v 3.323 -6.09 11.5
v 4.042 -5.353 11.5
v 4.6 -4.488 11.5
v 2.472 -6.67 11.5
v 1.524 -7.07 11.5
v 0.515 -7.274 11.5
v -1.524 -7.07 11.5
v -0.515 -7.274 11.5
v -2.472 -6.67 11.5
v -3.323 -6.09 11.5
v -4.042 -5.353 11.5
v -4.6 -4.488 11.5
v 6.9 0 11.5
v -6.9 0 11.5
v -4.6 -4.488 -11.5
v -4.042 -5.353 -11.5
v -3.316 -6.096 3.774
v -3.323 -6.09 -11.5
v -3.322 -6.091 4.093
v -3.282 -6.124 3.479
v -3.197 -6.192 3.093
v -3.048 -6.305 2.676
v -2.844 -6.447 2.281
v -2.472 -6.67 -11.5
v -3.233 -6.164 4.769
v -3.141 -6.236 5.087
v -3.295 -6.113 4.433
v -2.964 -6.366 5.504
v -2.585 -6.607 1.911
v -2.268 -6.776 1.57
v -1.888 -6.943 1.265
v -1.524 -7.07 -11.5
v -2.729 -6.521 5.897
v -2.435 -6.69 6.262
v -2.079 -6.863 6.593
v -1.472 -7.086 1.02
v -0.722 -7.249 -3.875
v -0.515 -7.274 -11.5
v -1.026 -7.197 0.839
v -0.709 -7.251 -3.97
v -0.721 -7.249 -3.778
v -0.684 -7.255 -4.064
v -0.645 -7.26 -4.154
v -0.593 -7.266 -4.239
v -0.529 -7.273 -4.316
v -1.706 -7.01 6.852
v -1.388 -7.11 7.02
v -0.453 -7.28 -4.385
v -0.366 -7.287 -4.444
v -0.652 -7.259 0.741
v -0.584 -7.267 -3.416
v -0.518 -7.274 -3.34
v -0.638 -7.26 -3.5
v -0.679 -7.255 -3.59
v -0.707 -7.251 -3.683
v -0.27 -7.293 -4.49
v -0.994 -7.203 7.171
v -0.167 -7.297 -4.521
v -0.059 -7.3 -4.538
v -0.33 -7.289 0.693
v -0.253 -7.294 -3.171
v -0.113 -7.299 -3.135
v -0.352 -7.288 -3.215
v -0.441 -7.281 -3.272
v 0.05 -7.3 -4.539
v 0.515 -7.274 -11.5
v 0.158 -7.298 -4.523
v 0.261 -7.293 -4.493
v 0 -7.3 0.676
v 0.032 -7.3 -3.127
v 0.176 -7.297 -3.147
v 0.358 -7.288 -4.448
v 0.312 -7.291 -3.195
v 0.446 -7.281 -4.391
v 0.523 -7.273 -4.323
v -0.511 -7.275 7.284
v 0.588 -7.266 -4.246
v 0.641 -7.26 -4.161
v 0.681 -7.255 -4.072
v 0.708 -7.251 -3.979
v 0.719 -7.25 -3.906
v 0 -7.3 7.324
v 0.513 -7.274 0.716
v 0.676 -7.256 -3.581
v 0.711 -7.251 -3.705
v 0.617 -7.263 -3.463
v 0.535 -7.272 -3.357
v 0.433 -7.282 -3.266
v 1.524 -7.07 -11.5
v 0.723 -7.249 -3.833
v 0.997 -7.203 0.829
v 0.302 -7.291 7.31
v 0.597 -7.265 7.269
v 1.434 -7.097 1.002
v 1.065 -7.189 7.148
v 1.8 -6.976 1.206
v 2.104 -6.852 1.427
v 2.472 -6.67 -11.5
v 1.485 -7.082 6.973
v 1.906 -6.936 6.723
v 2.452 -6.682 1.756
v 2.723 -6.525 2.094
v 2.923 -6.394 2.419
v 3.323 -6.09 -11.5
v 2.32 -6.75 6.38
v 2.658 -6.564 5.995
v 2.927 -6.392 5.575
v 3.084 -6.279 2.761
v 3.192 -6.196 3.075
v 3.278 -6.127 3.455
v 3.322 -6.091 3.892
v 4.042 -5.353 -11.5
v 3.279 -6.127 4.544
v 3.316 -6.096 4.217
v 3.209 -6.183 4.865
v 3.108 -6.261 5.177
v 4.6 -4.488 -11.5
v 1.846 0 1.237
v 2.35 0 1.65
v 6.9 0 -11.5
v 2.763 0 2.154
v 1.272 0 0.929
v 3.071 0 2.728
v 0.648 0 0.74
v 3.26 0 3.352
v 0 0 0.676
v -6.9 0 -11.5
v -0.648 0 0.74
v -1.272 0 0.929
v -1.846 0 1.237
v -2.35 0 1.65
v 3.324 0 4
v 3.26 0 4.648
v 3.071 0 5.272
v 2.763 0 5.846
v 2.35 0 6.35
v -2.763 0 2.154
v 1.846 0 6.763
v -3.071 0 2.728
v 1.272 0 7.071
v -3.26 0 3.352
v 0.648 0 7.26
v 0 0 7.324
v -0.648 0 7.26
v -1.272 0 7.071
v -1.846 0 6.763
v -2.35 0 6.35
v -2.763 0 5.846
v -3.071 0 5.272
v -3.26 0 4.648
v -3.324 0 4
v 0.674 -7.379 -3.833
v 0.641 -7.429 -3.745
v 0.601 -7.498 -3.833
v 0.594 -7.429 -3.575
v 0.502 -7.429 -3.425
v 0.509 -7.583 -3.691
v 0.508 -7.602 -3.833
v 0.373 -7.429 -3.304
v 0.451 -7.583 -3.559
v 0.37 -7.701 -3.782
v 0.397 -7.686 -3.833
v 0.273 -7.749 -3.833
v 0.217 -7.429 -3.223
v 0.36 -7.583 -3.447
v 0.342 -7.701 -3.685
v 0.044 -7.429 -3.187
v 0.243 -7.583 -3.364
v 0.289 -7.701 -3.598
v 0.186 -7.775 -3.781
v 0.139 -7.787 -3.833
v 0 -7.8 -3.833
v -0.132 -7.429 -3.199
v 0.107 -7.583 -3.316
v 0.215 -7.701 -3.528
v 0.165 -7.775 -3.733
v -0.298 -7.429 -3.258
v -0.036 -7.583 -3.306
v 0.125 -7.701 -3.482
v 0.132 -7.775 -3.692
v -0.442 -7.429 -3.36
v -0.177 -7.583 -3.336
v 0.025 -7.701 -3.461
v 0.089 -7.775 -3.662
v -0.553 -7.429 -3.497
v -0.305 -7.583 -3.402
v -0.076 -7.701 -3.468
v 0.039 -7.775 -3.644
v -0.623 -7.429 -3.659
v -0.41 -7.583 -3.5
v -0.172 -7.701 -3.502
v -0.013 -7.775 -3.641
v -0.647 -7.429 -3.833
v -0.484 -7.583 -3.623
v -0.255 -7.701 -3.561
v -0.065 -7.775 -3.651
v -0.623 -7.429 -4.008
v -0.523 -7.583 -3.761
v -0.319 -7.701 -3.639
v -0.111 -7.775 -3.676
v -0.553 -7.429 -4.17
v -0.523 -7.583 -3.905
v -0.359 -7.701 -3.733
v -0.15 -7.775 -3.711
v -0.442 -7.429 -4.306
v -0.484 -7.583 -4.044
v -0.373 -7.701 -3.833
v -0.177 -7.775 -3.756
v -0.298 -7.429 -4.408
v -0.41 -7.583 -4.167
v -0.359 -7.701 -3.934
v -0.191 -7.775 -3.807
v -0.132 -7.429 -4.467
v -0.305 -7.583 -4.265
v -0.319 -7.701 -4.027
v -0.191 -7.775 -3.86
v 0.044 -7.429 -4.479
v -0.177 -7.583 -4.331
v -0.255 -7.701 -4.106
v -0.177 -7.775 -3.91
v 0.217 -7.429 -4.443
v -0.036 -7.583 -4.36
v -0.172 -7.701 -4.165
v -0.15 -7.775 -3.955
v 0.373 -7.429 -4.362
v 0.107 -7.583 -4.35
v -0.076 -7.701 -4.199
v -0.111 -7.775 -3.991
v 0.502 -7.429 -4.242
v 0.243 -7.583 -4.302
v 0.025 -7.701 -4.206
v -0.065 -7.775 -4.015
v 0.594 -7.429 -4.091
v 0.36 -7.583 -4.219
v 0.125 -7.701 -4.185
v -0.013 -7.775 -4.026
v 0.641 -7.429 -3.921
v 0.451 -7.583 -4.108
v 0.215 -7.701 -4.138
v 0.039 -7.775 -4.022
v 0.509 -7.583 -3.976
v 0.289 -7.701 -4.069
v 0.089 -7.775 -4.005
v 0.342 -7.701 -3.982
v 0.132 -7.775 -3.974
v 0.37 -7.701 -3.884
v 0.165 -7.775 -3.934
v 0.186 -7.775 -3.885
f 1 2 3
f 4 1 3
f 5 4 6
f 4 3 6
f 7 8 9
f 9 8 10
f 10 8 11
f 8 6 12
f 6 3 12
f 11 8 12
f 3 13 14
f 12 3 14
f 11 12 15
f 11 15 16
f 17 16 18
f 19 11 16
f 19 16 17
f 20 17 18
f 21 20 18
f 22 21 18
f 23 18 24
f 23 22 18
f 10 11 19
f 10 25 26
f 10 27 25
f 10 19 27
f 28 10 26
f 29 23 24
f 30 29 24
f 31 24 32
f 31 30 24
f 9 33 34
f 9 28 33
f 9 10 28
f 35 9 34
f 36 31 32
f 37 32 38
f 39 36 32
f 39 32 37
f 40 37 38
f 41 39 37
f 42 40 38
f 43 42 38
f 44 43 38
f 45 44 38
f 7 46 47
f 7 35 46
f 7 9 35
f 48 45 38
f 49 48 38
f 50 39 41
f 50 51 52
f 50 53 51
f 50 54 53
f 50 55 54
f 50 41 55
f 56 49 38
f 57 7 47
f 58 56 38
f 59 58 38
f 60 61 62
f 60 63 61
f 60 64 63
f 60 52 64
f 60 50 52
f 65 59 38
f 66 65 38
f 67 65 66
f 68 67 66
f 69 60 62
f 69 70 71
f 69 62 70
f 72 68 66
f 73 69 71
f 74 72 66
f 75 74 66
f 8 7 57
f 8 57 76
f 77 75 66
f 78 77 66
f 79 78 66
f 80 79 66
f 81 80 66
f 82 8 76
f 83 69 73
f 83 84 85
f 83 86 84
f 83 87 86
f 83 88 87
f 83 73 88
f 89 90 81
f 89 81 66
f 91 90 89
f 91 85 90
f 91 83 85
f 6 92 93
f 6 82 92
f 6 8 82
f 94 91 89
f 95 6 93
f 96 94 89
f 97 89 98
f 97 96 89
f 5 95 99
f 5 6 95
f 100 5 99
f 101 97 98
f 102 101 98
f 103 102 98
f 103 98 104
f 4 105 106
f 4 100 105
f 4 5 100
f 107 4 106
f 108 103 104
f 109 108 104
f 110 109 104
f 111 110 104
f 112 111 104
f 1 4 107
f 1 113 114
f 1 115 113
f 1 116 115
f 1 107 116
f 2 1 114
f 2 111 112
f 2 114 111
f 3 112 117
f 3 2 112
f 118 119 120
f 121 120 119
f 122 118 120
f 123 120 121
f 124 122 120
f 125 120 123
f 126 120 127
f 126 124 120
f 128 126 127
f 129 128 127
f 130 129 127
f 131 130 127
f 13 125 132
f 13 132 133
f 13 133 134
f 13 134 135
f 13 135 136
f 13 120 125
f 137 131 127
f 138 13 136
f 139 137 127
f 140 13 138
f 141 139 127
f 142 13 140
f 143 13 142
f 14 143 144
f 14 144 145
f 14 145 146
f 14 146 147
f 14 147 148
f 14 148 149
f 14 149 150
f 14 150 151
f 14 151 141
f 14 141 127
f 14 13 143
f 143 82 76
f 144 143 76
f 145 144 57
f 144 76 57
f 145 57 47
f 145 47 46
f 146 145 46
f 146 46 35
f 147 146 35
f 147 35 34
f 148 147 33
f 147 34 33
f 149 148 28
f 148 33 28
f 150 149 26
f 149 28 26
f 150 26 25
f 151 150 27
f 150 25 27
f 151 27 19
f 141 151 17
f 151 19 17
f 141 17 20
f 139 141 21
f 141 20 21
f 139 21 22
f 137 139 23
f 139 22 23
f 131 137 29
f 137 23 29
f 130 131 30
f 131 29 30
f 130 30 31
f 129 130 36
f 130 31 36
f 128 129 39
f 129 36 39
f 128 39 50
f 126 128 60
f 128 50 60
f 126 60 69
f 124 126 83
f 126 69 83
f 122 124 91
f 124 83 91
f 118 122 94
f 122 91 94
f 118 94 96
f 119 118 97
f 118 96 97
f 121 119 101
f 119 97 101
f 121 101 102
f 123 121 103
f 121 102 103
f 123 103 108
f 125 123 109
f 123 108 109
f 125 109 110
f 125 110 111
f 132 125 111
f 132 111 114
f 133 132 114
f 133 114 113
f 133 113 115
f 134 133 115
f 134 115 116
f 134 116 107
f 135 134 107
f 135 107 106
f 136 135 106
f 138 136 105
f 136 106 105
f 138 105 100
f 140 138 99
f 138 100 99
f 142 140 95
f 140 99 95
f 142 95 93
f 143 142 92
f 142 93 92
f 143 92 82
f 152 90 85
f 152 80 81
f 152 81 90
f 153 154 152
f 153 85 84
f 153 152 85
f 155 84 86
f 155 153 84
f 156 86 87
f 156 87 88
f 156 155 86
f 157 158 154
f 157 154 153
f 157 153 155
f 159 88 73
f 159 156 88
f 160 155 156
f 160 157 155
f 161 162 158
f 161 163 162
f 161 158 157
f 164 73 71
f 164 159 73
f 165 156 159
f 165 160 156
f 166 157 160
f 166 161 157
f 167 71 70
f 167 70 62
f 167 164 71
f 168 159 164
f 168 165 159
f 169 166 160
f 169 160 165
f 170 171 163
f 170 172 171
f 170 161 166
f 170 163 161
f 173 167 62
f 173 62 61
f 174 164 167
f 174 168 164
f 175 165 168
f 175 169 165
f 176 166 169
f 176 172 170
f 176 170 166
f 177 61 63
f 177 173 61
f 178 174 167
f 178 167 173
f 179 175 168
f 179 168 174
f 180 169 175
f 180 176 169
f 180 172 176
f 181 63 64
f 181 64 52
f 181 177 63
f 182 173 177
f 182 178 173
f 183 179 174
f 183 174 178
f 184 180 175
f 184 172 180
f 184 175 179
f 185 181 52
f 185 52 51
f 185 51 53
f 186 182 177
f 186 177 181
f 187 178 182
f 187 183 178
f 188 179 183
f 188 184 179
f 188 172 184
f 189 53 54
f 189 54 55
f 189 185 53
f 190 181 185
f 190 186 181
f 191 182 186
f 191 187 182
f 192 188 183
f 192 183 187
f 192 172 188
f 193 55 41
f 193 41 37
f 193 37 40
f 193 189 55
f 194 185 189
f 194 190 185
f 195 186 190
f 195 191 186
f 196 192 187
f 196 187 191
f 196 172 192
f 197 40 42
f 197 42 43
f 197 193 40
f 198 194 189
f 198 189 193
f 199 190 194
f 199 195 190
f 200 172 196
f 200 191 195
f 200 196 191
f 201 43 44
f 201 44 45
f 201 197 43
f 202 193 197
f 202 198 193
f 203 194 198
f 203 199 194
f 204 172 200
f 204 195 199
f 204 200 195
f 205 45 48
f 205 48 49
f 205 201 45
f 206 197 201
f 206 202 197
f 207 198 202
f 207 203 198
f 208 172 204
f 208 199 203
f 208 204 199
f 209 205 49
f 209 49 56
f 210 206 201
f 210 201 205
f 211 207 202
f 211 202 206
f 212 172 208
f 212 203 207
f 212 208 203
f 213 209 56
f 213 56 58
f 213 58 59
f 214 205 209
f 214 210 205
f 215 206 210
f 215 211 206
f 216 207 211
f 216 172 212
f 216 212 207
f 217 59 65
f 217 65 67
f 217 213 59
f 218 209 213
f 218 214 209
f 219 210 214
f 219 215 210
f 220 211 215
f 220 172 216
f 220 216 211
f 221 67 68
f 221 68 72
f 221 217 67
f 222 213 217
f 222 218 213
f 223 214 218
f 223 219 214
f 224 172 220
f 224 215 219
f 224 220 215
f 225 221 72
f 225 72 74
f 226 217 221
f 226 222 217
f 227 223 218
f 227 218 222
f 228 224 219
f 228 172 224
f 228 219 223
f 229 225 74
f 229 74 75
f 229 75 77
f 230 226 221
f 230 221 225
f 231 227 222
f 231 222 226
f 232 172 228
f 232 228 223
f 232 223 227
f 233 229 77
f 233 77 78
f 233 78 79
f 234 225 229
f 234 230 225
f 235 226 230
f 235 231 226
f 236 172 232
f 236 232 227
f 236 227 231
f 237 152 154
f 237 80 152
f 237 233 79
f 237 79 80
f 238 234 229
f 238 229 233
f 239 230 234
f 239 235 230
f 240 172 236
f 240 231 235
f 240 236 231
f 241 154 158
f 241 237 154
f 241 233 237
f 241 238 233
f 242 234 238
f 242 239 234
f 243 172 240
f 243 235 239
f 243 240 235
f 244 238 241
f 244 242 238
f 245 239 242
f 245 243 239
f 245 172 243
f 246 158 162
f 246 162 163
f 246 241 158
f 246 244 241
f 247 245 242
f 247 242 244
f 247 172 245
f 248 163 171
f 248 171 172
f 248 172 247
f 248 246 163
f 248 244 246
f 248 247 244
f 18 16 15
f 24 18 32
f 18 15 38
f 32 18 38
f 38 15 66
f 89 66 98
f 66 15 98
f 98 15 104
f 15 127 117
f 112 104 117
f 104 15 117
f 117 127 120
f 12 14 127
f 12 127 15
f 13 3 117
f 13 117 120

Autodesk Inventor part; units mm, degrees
ref_plane "YZ Plane" through (0, 0, 0) normal (1, 0, 0) x (0, 1, 0)
sketch "Sketch2" plane through (0, 0, 0) normal (0, 1, 0) x (-1, 0, 0)
  line L0 (6.9, -11.5) -> (-6.9, -11.5)
  line L1 (-6.9, -11.5) -> (-6.9, 11.5)
  line L2 (-6.9, 11.5) -> (6.9, 11.5)
  line L3 (6.9, 11.5) -> (6.9, -11.5)
  point P0 (0, 4)
  point P1 (0, -11.5)
  point P2 (0, 11.5)
  point P3 (0, 0)
  point P4 (-6.9, 0)
  dimension "CenterHole" = 7.5
  dimension "Length" = 23
  dimension "Width" = 13.8
extrude "NutBase" add sketch "Sketch2" against normal blind 7.3
hole "Hole1" at (0, 0, 4) direction (0, -1, 0) diameter 6.647 end through all thread size "M8x1.25" class "6H" standard "ANSI Metric M Profile"
ref_plane "MidPlane" through (-6.9, 0, 0) normal (0, 0, -1) x (-1, 0, 0)
ref_plane "Work Plane4" through (6.9, 0, -3.8333) normal (0, 0, -1) x (-1, 0, 0)
sketch "Sketch3" plane through (-6.9, 0, 11.5) normal (0, 0, 1) x (1, 0, 0)
  line L0 (0, -7.3) -> (13.8, -7.3) construction
  line L1 (13.8, 0) -> (0, 0) projected
  line L2 (0, 0) -> (2.3, -4.4884)
  arc A0 (2.3, -4.4884) -> (11.5, -4.4884) centre (6.9, -2.1312) ccw
  line L3 (11.5, -4.4884) -> (13.8, 0)
  line L4 (6.9, -2.1312) -> (6.9, 0) construction
  dimension "d12" = 9.2
extrude "Standard TSlot" cut sketch "Sketch3" along normal through all both and the other way through all keep common part
sketch "Sketch5" plane through (-6.9, 0, 11.5) normal (0, 0, 1) x (1, 0, 0)
  line L0 (0, -7.3) -> (13.8, -7.3) construction
  line L1 (13.8, 0) -> (0, 0) projected
  line L2 (0, 0) -> (0, -7.3) construction
  line L3 (6.9, 0) -> (6.9, -7.3) construction
  line L4 (0, -0.8) -> (2.95, -0.8)
  line L5 (2.95, -0.8) -> (2.95, 0)
  line L6 (2.95, 0) -> (0, 0)
  line L7 (0, 0) -> (0, -0.8)
  line L8 (13.8, -0.8) -> (10.85, -0.8)
  line L9 (10.85, -0.8) -> (10.85, 0)
  line L10 (10.85, 0) -> (13.8, 0)
  line L11 (13.8, 0) -> (13.8, -0.8)
  dimension "Slot_Width" = 7.9
  dimension "d18" = 0.8
extrude "Self-Align TSlot" [suppressed]
sketch "Sketch6" plane through (-6.9, 0, 11.5) normal (0, 0, 1) x (1, 0, 0)
  line L0 (0, -7.3) -> (13.8, -7.3) projected
  line L1 (13.8, 0) -> (13.8, -7.3) projected
  line L2 (13.8, 0) -> (0, 0) projected
  line L3 (0, 0) -> (0, -7.3) projected
  line L4 (6.9, 0) -> (6.9, -7.3) construction
  line L5 (0, 0) -> (2.95, 0)
  line L6 (2.95, 0) -> (2.95, -3.5)
  line L7 (2.95, -3.5) -> (0, -3.5)
  line L8 (0, -3.5) -> (0, 0)
  line L9 (13.8, 0) -> (10.85, 0)
  line L10 (10.85, 0) -> (10.85, -3.5)
  line L11 (10.85, -3.5) -> (13.8, -3.5)
  line L12 (13.8, -3.5) -> (13.8, 0)
  arc A0 (0, -4.8) -> (2.5, -7.3) centre (2.5, -4.8) ccw
  arc A1 (11.3, -7.3) -> (13.8, -4.8) centre (11.3, -4.8) ccw
  dimension "HD_Slot_Depth" = 3.5
  dimension "HD_Slot_Width" = 7.9
  dimension "d23" = 2.5
extrude "Heavy Duty TSlot" [suppressed]
sketch "Sketch7" plane through (0, 0, 0) normal (0, 1, 0) x (1, 0, 0)
  line L0 (-6.9, 11.5) -> (6.9, 11.5) projected
  line L1 (-6.9, -11.5) -> (-6.9, 11.5) projected
  line L2 (6.9, -11.5) -> (-6.9, -11.5) projected
  line L3 (6.9, 11.5) -> (6.9, -11.5) projected
  arc A0 (6.9, 8.7381) -> (-6.9, 8.7381) centre (0, 1.5) ccw
  arc A1 (-6.9, -8.7381) -> (6.9, -8.7381) centre (0, -1.5) ccw
  line L4 (-9.66, 0) -> (9.66, 0) construction
  point P0 (0, 11.5)
  point P1 (0, -11.5)
  dimension "Economy_Fillet_Size" = 10
extrude "Economy TSlot" [suppressed]
sketch "Sketch9" plane through (0, -7.3, 0) normal (0, -1, 0) x (1, 0, 0)
  arc A0 (8, 8.5) -> (-8, 8.5) centre (0, 2.5) ccw projected
  line L0 (-9.5459, -8.5) -> (-9.5459, 8.5) projected
  arc A1 (-8, -8.5) -> (8, -8.5) centre (0, -2.5) ccw projected
  line L1 (9.5459, 8.5) -> (9.5459, -8.5) projected
  circle A2 centre (0, 4) radius 3.3235 construction
  circle A3 centre (0, 4) radius 4.5735
  dimension "d35" = 1.25
extrude "Economy TSlot2" [suppressed]
sketch "Sketch4" plane through (6.9, 0, -3.8333) normal (0, 0, -1) x (-1, 0, 0)
  circle A0 centre (6.9, -7.05) radius 0.75
  line L0 (6.9276, -6.3005) -> (6.8724, -6.3005)
  line L1 (6.9, -9.36) -> (6.9, 1.56) construction
  line L2 (13.8, -7.3) -> (0, -7.3) construction
  line L3 (6.9, -6.3005) -> (6.9, -7.8)
  line L4 (0, 0) -> (13.8, 0) construction
  dimension "d15" = 1.5
  dimension "d38" = 7.05
revolve "SpringBall" add sketch "Sketch4" angle 360 about axis through (0, -10, -3.8333) along (0, 1, 0) picked at (6.8409, -7.2931) contours A0 L3
mirror "Double Mirror" [suppressed]
sketch "Sketch10" plane through (-6.9, 0, 11.5) normal (0, 0, 1) x (1, 0, 0)
  line L0 (6.9, -8.76) -> (6.9, 1.46) construction
  line L1 (0, 0) -> (4.0362, 0)
  line L2 (4.0362, 0) -> (4.0362, -1.925)
  line L3 (4.0362, -1.925) -> (0, -1.925)
  line L4 (0, -1.925) -> (0, 0)
  line L5 (13.8, 0) -> (9.7638, 0)
  line L6 (9.7638, 0) -> (9.7638, -1.925)
  line L7 (9.7638, -1.925) -> (13.8, -1.925)
  line L8 (13.8, -1.925) -> (13.8, 0)
  dimension "d40" = 5.7276
  dimension "d41" = 1.925
extrude "Zn TSlot 1" [suppressed]
sketch "Sketch11" plane through (0, -7.3, 0) normal (0, -1, 0) x (1, 0, 0)
  circle A0 centre (0, 4) radius 3.3235 projected
  line L0 (-6.9, -11.5) -> (-6.9, 11.5) projected
  line L1 (6.9, -11.5) -> (-6.9, -11.5) projected
  line L2 (6.9, -11.5) -> (-6.9, 2.3)
  line L3 (0, 4) -> (-6.9, 10.9) construction
  line L4 (6.9, 11.5) -> (6.9, -11.5) projected
  line L5 (-6.9, 11.5) -> (6.9, -2.3)
  line L6 (-6.9, 11.5) -> (6.9, 11.5) projected
  dimension "d44" = 45
  dimension "d45" = 12.1622
  dimension "d48" = 45
extrude "Zn TSlot 2" [suppressed]
equation "\"d12\" = 0.666667 * Width"
equation "\"HD_Slot_Width\" = Slot_Width"
equation "\"d40\" = 0.707107 * Zn_C"
equation "\"d41\" = 0.25 * Zn_E"
equation "\"SpringBallPos\" = -0.333333 * Length"
equation "\"Zn_B\" = 27"
equation "\"Zn_C\" = 8.1"
equation "\"Zn_D\" = 7.9"
equation "\"Zn_E\" = 7.7"
properties part number "20-058" material "Steel, High Strength Low Alloy"
